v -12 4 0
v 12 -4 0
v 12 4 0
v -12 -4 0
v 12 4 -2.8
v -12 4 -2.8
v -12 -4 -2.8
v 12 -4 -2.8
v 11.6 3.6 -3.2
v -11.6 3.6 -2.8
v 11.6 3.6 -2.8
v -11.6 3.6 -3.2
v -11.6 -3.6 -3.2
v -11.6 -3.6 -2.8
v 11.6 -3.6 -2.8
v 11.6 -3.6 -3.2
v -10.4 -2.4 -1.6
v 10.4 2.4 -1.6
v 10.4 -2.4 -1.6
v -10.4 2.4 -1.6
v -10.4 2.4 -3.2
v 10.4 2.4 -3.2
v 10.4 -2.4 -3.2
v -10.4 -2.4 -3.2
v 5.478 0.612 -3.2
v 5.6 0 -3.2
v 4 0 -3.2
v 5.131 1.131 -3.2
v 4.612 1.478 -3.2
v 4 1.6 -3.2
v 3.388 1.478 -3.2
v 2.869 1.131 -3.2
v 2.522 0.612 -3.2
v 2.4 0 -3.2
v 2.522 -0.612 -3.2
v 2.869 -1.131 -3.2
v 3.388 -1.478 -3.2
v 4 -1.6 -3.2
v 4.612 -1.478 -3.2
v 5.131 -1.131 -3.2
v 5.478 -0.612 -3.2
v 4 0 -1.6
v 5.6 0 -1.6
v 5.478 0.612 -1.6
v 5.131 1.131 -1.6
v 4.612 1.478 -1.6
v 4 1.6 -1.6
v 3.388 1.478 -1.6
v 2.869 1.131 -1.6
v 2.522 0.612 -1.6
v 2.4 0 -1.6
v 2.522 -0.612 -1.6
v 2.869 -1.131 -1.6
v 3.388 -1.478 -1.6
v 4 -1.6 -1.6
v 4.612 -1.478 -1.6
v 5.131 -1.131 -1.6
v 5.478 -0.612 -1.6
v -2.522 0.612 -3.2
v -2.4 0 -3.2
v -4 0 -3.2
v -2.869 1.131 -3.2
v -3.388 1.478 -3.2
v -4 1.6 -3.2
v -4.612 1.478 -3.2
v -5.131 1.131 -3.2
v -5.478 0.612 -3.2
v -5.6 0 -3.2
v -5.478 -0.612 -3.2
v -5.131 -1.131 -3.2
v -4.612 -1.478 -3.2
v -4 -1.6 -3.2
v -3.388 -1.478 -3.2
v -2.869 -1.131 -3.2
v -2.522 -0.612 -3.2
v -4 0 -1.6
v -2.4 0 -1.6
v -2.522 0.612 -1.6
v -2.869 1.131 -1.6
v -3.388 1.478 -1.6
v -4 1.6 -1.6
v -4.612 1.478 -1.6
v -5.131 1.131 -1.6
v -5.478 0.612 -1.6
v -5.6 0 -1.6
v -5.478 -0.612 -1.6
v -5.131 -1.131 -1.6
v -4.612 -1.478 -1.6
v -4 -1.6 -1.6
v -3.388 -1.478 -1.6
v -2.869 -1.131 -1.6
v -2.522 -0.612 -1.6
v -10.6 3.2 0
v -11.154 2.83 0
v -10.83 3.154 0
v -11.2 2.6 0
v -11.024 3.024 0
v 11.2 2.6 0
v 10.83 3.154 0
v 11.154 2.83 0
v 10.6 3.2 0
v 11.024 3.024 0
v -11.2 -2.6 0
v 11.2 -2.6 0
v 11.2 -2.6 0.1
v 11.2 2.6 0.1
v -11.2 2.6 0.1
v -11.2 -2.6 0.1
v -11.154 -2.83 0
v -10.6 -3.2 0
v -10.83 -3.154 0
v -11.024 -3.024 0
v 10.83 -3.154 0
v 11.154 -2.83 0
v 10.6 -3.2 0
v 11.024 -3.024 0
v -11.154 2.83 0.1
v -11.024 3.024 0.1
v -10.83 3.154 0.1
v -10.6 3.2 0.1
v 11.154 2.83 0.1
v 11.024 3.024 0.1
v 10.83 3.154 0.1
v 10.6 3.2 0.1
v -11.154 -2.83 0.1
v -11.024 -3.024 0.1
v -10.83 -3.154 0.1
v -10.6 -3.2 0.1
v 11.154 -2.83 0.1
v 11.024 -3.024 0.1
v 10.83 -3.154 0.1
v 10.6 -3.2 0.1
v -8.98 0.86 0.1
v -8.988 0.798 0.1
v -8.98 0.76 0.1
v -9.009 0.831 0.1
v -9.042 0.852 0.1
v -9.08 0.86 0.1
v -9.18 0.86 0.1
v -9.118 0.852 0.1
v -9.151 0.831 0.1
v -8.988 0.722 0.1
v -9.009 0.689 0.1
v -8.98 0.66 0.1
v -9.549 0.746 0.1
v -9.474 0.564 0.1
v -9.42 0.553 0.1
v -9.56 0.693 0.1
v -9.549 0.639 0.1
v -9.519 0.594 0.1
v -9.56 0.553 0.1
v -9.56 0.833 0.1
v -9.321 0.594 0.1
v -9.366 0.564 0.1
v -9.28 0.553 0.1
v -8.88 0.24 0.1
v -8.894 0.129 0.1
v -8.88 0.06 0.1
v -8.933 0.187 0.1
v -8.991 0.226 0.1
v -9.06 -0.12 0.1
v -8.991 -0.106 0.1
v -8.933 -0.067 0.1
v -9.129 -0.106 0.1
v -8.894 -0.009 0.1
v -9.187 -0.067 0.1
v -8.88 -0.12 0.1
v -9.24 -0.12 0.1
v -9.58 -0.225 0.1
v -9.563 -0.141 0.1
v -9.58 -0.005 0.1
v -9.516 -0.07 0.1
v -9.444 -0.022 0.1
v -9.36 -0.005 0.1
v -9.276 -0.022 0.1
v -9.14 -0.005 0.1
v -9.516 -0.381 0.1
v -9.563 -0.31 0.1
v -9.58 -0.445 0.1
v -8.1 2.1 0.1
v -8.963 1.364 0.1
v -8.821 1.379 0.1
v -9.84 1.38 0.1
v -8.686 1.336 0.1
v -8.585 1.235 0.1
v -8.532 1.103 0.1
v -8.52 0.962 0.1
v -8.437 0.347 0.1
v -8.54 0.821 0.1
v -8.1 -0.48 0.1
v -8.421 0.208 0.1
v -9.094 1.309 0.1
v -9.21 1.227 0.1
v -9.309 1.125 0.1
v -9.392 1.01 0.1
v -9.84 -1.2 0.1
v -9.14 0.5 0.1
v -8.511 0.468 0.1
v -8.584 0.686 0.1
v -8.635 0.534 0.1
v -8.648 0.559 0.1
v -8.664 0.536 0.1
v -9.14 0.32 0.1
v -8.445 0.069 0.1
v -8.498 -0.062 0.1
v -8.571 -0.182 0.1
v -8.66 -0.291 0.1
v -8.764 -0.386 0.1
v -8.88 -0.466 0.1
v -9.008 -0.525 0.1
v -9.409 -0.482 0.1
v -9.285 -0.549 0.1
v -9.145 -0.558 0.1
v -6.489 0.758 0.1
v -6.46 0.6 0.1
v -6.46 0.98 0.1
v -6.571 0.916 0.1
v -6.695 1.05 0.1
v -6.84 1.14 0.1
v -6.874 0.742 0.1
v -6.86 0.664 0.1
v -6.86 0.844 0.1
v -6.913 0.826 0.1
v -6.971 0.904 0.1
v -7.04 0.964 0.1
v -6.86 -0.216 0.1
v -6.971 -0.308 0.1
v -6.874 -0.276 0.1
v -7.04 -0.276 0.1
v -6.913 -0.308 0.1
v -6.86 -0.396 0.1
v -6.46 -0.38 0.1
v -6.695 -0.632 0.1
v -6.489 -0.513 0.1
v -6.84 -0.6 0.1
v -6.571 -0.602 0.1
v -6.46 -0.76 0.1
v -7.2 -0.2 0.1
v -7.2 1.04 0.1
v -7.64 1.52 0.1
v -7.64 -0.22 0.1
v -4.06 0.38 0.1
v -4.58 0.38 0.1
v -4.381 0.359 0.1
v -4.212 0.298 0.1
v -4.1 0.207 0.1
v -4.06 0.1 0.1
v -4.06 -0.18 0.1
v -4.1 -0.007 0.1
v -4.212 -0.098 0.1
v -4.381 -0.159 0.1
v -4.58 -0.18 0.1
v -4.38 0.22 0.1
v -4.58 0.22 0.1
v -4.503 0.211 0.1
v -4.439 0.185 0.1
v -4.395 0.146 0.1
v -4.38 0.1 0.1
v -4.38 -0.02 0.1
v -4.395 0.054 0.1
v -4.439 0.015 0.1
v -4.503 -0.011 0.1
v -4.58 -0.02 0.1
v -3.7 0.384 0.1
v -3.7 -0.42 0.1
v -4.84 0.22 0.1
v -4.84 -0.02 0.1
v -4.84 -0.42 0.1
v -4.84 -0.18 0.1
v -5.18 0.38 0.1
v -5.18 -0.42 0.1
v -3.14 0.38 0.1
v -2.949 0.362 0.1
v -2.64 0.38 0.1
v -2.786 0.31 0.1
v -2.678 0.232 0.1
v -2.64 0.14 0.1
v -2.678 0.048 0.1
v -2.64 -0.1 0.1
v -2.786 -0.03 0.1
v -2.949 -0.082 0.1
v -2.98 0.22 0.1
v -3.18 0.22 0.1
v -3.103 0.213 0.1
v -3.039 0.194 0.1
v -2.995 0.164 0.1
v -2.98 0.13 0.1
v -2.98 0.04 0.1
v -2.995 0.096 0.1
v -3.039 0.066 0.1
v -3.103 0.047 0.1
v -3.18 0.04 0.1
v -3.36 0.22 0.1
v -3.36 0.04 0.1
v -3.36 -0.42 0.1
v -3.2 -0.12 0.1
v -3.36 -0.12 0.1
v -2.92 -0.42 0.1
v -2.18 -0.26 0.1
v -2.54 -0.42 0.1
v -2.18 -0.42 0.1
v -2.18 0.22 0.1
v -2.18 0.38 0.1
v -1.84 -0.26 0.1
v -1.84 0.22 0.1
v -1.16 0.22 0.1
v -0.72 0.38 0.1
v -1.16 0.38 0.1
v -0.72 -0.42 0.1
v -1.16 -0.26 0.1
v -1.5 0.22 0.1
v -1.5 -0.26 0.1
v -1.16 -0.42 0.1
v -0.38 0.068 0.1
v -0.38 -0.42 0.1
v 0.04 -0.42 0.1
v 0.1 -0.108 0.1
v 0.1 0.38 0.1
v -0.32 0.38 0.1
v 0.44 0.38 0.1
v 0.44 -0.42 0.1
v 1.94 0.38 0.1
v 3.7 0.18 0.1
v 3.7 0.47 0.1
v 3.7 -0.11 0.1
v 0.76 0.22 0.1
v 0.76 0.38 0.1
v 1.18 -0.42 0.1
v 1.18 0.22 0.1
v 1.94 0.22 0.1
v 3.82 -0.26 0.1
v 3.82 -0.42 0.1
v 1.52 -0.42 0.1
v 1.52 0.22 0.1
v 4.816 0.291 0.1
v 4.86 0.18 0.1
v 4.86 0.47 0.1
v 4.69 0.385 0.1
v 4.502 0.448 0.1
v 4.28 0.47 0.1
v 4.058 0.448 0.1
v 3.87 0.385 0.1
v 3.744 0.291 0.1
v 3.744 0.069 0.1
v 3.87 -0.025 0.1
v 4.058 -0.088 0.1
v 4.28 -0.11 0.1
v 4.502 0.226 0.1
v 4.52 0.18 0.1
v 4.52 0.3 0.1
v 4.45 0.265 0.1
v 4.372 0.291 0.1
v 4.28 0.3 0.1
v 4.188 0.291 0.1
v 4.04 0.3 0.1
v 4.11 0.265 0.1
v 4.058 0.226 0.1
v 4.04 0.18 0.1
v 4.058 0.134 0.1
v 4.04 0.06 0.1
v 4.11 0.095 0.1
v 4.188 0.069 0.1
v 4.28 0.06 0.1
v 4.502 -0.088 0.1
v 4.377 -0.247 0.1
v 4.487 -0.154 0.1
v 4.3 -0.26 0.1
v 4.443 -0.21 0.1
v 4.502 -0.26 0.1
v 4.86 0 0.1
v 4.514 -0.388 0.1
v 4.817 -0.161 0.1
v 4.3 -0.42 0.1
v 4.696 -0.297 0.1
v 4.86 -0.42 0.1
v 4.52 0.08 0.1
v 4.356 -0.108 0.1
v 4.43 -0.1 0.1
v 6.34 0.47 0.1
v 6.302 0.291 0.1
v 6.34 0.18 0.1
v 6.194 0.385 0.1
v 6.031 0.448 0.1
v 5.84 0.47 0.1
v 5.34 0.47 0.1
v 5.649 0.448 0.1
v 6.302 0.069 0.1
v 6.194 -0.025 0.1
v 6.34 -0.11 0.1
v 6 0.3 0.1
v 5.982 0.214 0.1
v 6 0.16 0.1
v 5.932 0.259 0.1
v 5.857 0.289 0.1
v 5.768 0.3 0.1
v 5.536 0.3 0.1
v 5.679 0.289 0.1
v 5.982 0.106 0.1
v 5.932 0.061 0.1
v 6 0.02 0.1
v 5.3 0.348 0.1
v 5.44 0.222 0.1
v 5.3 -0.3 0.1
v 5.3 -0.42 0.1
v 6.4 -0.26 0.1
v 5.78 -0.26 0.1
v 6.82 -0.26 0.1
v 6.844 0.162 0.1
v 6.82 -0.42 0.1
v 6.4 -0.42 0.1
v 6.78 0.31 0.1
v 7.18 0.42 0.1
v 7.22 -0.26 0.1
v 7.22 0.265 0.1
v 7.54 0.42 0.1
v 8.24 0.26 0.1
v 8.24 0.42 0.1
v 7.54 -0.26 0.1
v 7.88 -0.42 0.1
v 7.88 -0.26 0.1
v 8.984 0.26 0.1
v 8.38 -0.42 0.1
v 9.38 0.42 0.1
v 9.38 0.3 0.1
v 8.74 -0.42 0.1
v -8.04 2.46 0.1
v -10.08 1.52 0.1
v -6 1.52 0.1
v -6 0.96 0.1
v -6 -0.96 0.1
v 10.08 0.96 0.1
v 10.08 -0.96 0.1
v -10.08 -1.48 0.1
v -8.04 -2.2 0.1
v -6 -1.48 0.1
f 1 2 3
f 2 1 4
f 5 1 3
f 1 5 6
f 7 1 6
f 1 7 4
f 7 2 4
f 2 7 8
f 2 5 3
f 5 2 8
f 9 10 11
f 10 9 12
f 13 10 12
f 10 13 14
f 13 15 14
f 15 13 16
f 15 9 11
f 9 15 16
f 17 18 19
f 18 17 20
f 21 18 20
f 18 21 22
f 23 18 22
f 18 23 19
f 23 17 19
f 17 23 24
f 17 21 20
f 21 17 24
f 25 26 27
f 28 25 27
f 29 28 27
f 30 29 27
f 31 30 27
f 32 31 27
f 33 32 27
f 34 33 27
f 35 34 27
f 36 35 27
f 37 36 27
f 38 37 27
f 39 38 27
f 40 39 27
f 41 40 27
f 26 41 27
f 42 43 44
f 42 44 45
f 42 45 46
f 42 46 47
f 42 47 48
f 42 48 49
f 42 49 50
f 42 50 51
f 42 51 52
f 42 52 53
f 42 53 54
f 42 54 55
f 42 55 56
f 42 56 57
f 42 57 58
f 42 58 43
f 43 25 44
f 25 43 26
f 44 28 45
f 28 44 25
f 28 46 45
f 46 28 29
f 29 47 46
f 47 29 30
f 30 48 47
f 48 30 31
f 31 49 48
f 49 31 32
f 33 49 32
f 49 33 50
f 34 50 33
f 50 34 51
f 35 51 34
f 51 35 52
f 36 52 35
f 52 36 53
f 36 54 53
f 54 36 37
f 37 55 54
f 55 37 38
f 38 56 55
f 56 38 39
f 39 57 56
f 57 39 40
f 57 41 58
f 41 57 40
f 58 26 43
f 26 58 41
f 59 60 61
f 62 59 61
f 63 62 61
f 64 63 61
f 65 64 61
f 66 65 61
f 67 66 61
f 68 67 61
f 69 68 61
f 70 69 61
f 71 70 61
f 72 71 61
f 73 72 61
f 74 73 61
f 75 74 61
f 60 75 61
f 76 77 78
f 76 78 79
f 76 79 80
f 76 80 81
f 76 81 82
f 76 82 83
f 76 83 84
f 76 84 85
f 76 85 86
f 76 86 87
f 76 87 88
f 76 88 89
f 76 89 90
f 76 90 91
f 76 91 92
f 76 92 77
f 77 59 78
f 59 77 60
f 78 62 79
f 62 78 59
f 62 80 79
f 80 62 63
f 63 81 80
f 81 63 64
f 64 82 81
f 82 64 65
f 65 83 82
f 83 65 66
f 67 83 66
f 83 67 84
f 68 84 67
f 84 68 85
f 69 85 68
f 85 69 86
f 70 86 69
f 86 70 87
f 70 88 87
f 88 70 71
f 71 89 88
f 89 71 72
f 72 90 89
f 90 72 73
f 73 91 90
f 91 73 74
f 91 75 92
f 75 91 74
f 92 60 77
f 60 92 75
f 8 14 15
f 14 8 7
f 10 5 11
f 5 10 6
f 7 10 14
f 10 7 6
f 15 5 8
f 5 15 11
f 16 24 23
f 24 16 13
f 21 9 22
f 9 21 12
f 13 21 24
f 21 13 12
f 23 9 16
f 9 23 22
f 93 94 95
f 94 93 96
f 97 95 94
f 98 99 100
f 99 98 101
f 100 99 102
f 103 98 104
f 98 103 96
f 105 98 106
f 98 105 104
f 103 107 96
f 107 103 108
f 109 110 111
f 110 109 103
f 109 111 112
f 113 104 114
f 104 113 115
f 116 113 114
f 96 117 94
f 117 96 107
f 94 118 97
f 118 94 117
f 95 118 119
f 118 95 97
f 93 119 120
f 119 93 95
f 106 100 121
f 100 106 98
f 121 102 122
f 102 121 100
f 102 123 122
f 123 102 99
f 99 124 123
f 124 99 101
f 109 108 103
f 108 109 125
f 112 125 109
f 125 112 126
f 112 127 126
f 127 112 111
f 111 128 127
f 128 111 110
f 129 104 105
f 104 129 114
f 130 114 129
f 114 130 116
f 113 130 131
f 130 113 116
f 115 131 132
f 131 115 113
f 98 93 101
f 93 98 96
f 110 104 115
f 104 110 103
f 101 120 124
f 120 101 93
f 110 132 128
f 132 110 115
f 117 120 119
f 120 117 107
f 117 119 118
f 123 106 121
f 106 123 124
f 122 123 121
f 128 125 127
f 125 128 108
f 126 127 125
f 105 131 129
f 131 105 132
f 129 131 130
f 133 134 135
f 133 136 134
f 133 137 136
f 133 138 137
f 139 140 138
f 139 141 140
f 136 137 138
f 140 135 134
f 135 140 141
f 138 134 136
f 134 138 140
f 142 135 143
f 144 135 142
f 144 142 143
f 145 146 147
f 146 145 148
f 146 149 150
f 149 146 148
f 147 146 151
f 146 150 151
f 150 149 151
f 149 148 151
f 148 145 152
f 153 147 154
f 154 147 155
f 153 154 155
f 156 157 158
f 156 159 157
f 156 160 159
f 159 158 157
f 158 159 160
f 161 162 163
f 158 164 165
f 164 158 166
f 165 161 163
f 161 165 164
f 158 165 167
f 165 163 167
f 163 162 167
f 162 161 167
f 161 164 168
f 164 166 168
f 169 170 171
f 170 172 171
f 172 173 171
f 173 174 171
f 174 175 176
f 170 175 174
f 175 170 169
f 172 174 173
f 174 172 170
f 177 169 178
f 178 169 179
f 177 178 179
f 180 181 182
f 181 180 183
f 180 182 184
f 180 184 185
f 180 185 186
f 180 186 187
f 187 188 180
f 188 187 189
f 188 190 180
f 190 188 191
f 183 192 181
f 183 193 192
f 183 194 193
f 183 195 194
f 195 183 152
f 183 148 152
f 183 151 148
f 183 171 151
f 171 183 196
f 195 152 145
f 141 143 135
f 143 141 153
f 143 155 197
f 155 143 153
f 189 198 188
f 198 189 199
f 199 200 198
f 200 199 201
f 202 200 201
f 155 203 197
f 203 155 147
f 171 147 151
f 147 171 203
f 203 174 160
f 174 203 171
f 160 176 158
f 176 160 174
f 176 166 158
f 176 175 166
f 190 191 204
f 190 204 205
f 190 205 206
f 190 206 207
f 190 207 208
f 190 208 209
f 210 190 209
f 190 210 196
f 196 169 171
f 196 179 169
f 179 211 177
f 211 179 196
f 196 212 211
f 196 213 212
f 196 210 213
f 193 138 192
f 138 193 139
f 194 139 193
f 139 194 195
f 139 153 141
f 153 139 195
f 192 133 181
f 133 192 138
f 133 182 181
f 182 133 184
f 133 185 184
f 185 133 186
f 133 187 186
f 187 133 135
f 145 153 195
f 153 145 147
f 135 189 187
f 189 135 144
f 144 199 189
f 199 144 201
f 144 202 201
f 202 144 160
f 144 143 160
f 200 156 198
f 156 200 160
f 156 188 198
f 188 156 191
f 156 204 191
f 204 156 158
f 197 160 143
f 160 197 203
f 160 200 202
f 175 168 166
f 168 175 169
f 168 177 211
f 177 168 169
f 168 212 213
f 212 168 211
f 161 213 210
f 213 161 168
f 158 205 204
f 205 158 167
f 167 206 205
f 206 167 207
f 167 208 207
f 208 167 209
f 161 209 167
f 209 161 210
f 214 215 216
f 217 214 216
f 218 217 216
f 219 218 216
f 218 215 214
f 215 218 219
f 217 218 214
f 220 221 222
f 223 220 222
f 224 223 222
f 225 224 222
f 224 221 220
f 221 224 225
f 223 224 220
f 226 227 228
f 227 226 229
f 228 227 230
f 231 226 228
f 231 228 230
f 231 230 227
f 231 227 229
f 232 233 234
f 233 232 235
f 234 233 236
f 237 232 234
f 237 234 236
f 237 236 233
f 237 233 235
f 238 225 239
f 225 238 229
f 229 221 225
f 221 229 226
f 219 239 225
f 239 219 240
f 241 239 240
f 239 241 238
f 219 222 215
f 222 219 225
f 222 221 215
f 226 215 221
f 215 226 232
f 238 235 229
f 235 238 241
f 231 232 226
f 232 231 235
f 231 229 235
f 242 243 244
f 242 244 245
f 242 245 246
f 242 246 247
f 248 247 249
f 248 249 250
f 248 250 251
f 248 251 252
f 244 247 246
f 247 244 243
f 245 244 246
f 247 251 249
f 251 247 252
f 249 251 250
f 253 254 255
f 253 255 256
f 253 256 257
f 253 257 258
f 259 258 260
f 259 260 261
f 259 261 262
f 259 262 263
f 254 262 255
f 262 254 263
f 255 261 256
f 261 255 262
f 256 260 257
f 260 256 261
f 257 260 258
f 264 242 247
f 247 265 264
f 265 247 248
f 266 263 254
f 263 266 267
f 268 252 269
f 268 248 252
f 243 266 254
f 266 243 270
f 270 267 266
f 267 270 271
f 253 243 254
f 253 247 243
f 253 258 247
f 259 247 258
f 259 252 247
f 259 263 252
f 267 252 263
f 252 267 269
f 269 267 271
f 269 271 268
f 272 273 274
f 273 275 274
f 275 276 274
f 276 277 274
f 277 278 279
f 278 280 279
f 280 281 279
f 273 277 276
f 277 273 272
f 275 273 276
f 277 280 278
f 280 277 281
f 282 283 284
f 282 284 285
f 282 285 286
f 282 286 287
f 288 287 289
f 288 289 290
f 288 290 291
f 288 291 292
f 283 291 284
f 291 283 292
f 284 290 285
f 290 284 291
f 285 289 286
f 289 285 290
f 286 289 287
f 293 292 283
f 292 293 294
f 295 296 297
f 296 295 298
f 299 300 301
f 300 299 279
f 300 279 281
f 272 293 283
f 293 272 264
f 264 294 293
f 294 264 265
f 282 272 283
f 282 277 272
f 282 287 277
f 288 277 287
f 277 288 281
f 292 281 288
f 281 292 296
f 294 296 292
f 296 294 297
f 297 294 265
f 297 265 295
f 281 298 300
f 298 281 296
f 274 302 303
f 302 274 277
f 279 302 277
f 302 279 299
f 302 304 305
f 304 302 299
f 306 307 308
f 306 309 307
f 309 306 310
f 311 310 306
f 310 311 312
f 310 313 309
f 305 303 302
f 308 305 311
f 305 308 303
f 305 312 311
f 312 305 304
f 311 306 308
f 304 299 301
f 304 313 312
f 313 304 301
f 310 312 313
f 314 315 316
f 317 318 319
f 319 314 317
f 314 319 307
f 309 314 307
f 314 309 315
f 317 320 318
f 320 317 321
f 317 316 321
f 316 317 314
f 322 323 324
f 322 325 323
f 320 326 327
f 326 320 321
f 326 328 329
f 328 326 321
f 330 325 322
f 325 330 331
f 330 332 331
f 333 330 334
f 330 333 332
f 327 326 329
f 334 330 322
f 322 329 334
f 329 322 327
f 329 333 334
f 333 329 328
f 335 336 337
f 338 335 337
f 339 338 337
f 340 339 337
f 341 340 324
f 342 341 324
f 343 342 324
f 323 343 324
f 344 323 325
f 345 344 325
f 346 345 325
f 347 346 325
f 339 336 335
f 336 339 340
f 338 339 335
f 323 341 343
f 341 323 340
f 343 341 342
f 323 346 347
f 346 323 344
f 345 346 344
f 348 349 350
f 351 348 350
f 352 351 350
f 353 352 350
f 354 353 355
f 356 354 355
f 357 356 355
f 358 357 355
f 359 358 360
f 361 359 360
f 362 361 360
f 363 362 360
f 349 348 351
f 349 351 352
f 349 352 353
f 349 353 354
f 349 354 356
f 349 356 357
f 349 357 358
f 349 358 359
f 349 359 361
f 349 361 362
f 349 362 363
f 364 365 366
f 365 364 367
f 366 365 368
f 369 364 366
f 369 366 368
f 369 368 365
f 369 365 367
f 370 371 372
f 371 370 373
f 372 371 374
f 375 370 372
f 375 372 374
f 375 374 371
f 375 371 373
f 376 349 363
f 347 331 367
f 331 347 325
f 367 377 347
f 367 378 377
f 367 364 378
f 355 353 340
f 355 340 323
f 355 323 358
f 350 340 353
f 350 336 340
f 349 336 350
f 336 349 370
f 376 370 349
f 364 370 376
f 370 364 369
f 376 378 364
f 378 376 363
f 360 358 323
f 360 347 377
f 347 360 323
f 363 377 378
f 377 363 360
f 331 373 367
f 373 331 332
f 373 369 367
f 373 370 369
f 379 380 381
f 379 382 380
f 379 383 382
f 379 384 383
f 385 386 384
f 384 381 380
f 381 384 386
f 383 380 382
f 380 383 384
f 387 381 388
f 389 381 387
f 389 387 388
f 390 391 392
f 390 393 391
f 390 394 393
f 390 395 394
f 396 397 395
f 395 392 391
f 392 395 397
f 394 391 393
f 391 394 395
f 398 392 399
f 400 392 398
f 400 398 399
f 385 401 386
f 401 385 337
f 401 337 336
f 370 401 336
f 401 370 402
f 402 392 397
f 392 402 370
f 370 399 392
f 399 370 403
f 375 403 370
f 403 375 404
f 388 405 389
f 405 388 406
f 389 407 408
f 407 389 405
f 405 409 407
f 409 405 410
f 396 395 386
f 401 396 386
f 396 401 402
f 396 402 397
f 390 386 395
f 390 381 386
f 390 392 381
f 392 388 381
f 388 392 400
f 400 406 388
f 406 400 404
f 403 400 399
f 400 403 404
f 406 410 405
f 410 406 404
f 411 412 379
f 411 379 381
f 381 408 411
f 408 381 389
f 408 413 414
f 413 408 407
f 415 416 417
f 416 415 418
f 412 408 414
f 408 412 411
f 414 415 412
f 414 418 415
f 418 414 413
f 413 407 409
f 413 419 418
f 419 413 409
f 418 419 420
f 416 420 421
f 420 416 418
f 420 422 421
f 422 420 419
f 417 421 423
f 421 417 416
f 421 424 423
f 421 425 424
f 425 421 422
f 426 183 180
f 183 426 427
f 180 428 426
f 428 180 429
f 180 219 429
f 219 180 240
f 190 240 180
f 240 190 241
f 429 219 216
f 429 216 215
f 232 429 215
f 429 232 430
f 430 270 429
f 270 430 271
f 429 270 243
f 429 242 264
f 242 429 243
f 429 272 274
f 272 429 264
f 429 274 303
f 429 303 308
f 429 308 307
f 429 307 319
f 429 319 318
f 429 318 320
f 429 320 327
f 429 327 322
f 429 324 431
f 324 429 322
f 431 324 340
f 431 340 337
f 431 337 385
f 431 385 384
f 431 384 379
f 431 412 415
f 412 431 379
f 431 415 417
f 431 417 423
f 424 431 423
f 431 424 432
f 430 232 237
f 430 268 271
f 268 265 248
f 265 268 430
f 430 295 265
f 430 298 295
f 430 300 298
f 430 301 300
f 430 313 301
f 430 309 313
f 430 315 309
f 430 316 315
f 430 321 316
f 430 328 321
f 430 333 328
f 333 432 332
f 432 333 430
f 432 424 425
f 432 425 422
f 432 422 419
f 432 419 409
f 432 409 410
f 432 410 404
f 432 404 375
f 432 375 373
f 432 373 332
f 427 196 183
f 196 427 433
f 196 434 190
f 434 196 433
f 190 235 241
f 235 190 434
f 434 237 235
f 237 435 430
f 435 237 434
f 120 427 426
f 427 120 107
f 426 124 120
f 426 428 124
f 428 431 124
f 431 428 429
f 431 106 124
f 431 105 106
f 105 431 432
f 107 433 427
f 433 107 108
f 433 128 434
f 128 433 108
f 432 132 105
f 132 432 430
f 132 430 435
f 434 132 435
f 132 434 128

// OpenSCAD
use <../lib.scad>
use <6177970j.scad>
use <63864.scad>
function ldraw_lib__63864d0a() = [
// 0 Tile  1 x  3 with "3D Print 9217" in Black on White Background Sticker
// 0 Name: 63864d0a.dat
// 0 Author: Vincent Messenet [Cheenzo]
// 0 !LDRAW_ORG Shortcut UPDATE 2026-07
// 0 !LICENSE Licensed under CC BY 4.0 : see CAreadme.txt
// 
// 0 BFC CERTIFY CCW
  [0,"BFC","CERTIFY"],
  [0,"BFC","CCW"],
// 
// 0 !CATEGORY Sticker Shortcut
// 0 !KEYWORDS BrickLink 63864pb269, BrickLink 75882stk01, Center, Development
// 0 !KEYWORDS FXXK, Rebrickable 30899, Set 75882, Speed Champions, Tunnel, Wind
// 
// 0 !HISTORY 2026-07-30 [OrionP] Official Update 2026-07
// 
// 1 16 0 0 0 1 0 0 0 1 0 0 0 1 63864.dat
  [1,16,0,0,0,1,0,0,0,1,0,0,0,1, ldraw_lib__63864()],
// 1 16 0 0 0 1 0 0 0 1 0 0 0 1 6177970j.dat
  [1,16,0,0,0,1,0,0,0,1,0,0,0,1, ldraw_lib__6177970j()],
];
module ldraw_lib__63864d0a(step=0, col=false, unit=2/5, alt=false, line=0.2, solid=!$preview)
    makepoly(ldraw_lib__63864d0a(), step=step, col=col, unit=unit, alt=alt, line=line, solid=solid);
ldraw_lib__63864d0a(line=0.2);
